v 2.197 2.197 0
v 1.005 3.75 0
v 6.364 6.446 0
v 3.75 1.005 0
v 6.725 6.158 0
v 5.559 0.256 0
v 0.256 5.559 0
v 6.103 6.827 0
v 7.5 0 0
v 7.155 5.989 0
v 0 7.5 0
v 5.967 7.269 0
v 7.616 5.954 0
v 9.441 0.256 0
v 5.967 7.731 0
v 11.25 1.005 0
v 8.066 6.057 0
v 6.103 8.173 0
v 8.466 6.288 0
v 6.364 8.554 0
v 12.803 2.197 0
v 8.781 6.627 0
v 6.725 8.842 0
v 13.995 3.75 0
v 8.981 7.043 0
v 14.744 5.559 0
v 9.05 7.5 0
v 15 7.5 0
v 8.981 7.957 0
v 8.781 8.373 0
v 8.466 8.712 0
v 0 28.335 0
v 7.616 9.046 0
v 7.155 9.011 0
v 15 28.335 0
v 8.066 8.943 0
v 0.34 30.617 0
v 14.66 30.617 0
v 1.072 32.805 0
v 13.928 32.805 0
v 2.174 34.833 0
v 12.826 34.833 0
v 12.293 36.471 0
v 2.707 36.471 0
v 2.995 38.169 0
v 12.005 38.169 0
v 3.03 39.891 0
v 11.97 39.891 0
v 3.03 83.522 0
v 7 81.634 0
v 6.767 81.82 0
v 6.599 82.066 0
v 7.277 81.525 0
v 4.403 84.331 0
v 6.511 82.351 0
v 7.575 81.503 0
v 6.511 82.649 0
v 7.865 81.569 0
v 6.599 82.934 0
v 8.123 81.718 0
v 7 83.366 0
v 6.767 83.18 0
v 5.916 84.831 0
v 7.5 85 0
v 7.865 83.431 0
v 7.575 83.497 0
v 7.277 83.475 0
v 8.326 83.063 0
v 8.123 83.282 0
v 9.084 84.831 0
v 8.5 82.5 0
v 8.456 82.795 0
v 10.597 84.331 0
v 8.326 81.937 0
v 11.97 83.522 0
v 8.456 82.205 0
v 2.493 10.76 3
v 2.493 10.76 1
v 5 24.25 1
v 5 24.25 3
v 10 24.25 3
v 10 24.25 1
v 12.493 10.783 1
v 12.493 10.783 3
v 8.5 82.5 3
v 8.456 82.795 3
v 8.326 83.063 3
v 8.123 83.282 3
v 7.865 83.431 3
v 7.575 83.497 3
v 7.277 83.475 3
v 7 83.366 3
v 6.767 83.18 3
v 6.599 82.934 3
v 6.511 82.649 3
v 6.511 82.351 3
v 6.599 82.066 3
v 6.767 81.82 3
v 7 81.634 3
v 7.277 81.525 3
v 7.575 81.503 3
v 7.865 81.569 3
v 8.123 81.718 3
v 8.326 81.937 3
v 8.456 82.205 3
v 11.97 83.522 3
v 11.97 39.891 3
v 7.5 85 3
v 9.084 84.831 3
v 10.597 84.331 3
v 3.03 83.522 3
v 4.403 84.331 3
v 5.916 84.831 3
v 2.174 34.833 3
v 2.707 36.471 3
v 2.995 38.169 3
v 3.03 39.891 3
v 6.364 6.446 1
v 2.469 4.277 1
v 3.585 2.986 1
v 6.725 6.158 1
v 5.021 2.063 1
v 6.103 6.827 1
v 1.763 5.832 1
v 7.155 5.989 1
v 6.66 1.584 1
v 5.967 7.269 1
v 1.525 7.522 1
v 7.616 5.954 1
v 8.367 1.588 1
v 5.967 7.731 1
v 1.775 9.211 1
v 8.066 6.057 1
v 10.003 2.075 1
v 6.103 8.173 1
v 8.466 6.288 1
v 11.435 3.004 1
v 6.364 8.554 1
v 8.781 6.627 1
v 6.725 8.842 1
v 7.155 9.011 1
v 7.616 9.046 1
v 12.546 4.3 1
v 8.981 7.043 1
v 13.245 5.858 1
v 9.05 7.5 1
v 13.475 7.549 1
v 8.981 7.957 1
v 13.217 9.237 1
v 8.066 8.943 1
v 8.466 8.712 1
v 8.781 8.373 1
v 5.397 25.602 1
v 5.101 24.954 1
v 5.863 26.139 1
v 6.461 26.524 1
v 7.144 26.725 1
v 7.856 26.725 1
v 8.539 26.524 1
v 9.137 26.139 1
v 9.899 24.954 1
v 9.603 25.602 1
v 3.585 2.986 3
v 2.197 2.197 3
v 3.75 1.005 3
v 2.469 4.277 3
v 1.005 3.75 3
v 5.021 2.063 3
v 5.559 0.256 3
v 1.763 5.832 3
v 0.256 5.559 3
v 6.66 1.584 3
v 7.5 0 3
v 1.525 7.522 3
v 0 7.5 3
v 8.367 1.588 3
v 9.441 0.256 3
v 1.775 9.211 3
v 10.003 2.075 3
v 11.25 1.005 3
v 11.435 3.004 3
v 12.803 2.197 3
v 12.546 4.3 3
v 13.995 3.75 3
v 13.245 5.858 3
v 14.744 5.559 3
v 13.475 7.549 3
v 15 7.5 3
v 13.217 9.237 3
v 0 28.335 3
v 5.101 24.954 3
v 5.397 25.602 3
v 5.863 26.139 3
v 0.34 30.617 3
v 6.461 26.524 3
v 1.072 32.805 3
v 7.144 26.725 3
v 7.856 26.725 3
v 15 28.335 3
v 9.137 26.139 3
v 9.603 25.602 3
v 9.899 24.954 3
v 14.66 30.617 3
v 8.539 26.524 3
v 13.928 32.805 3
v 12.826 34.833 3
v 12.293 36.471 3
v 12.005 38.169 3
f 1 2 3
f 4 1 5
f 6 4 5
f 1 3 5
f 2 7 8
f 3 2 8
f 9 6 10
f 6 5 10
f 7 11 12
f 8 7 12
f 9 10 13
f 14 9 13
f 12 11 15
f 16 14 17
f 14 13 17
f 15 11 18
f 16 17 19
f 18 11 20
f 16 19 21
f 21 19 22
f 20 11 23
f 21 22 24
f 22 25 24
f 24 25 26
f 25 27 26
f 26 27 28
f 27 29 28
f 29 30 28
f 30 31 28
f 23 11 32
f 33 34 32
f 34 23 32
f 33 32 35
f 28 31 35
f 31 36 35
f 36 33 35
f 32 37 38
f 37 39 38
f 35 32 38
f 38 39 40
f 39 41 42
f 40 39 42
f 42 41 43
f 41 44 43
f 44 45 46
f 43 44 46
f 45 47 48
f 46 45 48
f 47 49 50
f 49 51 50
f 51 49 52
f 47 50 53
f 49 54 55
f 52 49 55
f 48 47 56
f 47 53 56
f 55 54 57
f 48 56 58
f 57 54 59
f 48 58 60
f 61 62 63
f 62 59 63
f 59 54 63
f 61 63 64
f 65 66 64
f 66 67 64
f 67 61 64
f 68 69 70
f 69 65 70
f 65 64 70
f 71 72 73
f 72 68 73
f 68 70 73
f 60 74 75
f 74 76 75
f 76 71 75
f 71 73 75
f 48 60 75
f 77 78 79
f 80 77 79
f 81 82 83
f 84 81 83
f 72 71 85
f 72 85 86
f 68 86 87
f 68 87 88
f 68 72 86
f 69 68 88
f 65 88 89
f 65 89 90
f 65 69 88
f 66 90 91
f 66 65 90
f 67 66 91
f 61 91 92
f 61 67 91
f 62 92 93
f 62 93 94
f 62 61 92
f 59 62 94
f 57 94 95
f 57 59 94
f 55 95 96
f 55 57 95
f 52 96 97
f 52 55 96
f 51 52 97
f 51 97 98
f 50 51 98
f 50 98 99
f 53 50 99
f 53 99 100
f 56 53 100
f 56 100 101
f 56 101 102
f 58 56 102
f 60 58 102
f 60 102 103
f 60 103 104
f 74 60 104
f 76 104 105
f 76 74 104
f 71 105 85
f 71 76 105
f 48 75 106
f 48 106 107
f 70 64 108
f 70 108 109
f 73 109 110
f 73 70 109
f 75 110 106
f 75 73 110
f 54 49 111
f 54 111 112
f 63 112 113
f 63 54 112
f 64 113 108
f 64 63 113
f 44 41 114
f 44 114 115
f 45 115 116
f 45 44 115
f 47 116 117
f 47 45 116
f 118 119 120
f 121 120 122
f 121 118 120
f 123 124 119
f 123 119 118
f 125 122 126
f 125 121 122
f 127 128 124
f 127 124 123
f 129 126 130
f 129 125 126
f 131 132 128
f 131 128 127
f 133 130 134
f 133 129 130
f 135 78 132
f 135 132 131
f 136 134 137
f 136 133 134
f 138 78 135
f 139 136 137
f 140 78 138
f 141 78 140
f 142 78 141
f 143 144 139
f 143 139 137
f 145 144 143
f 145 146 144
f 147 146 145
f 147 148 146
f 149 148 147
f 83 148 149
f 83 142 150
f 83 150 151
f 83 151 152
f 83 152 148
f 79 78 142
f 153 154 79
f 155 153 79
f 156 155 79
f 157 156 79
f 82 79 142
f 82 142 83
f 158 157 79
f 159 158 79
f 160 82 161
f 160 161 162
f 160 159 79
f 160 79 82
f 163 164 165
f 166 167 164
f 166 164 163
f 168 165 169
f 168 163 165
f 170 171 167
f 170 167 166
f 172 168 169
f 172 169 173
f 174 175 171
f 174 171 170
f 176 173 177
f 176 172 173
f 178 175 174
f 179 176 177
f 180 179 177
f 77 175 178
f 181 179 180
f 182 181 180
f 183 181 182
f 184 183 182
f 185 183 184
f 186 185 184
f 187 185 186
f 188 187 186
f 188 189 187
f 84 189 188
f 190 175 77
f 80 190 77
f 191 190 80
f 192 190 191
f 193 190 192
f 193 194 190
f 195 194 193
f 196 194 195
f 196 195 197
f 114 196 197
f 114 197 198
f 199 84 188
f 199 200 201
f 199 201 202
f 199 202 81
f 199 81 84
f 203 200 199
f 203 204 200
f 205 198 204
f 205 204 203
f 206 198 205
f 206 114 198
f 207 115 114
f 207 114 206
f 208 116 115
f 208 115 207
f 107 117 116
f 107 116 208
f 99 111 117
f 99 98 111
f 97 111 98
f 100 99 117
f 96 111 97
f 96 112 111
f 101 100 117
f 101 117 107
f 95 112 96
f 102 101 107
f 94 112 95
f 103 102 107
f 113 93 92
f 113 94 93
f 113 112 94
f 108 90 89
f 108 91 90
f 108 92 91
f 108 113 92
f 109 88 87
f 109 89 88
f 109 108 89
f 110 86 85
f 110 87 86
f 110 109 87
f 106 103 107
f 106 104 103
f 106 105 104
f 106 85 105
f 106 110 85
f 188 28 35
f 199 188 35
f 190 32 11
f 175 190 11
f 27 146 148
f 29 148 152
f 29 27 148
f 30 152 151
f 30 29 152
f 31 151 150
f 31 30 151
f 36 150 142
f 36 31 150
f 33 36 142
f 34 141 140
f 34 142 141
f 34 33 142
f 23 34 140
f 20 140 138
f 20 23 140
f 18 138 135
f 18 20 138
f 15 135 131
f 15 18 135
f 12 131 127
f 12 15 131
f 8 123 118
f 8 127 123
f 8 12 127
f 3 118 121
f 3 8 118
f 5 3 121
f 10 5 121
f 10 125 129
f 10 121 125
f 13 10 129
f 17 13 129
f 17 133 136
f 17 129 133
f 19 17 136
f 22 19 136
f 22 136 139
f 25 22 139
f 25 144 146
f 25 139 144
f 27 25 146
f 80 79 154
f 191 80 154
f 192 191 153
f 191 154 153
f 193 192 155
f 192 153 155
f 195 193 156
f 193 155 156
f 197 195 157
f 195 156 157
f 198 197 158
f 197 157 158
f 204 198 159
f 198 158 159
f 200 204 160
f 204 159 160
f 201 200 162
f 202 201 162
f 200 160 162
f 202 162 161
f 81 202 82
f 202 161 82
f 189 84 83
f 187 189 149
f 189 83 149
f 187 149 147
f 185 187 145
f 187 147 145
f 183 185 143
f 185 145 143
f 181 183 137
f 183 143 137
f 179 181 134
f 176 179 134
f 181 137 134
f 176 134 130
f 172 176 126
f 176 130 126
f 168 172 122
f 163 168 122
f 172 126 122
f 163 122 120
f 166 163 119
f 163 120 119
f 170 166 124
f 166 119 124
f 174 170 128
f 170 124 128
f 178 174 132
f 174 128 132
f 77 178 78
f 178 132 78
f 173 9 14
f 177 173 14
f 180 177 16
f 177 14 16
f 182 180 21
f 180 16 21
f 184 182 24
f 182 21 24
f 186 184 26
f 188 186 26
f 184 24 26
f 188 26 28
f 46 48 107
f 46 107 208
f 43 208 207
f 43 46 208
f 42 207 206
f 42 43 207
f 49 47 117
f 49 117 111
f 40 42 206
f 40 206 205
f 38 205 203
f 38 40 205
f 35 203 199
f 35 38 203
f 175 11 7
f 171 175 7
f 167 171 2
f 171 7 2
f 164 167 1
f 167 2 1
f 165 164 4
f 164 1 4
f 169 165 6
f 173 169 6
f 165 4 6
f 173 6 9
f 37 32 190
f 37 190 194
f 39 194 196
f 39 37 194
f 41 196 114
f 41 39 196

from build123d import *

# Parameters (mm, degrees)
BOSS_EXTRUDE1_DEPTH = 3
BOSS_EXTRUDE2_DEPTH = 1
SKETCH2_R           = 1
SKETCH2_R_2         = 1.55
CUT_EXTRUDE1_DEPTH  = 87.365502372


with BuildPart() as part:
    # Sketch1 → Boss-Extrude1 (new body)
    with BuildSketch(Plane.XY):
        with BuildLine():
            ThreePointArc((0, 7.5), (2.196699141, 2.196699141), (7.5, 0))
            ThreePointArc((7.5, 0), (12.803300859, 2.196699141), (15, 7.5))
            Line((15, 7.5), (15, 85))
            Line((15, 85), (0, 85))
            Line((0, 85), (0, 7.5))
        make_face()
        with BuildLine():
            Line((2.49254211, 10.759753131), (5, 24.25))
            ThreePointArc((5, 24.25), (7.5, 26.75), (10, 24.25))
            Line((10, 24.25), (12.49254211, 10.782552099))
            ThreePointArc((12.49254211, 10.782552099), (7.513622348, 1.525015529), (2.49254211, 10.759753131))
        make_face(mode=Mode.SUBTRACT)
    extrude(amount=BOSS_EXTRUDE1_DEPTH)

    # Sketch1<3> → Boss-Extrude2 (add)
    with BuildSketch(Plane.XY):
        with BuildLine():
            ThreePointArc((10, 24.25), (7.5, 26.75), (5, 24.25))
            Line((5, 24.25), (2.49254211, 10.759753131))
            ThreePointArc((2.49254211, 10.759753131), (7.513622348, 1.525015529), (12.49254211, 10.782552099))
            Line((12.49254211, 10.782552099), (10, 24.25))
        make_face()
    extrude(amount=BOSS_EXTRUDE2_DEPTH)

    # Sketch2 → Cut-Extrude1 (cut, through all)
    with BuildSketch(Plane.XY.offset(3)):
        with BuildLine():
            Line((15, 85), (7.5, 85))
            ThreePointArc((7.5, 85), (9.854016149, 84.620997681), (11.970118276, 83.522295459))
            Line((11.970118276, 83.522295459), (11.970118276, 39.891256895))
            ThreePointArc((11.970118276, 39.891256895), (12.117855654, 37.314502111), (12.826153951, 34.832606652))
            ThreePointArc((12.826153951, 34.832606652), (14.342347227, 31.727350556), (15, 28.334866171))
            Line((15, 28.334866171), (15, 85))
        make_face()
        with BuildLine():
            Line((7.5, 85), (0, 85))
            Line((0, 85), (0, 28.334866171))
            ThreePointArc((0, 28.334866171), (0.657652773, 31.727350556), (2.173846049, 34.832606652))
            ThreePointArc((2.173846049, 34.832606652), (2.882144346, 37.314502111), (3.029881724, 39.891256895))
            Line((3.029881724, 39.891256895), (3.029881724, 83.522295459))
            ThreePointArc((3.029881724, 83.522295459), (5.145983851, 84.620997681), (7.5, 85))
        make_face()
        with Locations((7.5, 82.5)):
            Circle(SKETCH2_R)
        with Locations((7.5, 7.5)):
            Circle(SKETCH2_R_2)
    extrude(amount=-CUT_EXTRUDE1_DEPTH, mode=Mode.SUBTRACT)


solid = part.part
